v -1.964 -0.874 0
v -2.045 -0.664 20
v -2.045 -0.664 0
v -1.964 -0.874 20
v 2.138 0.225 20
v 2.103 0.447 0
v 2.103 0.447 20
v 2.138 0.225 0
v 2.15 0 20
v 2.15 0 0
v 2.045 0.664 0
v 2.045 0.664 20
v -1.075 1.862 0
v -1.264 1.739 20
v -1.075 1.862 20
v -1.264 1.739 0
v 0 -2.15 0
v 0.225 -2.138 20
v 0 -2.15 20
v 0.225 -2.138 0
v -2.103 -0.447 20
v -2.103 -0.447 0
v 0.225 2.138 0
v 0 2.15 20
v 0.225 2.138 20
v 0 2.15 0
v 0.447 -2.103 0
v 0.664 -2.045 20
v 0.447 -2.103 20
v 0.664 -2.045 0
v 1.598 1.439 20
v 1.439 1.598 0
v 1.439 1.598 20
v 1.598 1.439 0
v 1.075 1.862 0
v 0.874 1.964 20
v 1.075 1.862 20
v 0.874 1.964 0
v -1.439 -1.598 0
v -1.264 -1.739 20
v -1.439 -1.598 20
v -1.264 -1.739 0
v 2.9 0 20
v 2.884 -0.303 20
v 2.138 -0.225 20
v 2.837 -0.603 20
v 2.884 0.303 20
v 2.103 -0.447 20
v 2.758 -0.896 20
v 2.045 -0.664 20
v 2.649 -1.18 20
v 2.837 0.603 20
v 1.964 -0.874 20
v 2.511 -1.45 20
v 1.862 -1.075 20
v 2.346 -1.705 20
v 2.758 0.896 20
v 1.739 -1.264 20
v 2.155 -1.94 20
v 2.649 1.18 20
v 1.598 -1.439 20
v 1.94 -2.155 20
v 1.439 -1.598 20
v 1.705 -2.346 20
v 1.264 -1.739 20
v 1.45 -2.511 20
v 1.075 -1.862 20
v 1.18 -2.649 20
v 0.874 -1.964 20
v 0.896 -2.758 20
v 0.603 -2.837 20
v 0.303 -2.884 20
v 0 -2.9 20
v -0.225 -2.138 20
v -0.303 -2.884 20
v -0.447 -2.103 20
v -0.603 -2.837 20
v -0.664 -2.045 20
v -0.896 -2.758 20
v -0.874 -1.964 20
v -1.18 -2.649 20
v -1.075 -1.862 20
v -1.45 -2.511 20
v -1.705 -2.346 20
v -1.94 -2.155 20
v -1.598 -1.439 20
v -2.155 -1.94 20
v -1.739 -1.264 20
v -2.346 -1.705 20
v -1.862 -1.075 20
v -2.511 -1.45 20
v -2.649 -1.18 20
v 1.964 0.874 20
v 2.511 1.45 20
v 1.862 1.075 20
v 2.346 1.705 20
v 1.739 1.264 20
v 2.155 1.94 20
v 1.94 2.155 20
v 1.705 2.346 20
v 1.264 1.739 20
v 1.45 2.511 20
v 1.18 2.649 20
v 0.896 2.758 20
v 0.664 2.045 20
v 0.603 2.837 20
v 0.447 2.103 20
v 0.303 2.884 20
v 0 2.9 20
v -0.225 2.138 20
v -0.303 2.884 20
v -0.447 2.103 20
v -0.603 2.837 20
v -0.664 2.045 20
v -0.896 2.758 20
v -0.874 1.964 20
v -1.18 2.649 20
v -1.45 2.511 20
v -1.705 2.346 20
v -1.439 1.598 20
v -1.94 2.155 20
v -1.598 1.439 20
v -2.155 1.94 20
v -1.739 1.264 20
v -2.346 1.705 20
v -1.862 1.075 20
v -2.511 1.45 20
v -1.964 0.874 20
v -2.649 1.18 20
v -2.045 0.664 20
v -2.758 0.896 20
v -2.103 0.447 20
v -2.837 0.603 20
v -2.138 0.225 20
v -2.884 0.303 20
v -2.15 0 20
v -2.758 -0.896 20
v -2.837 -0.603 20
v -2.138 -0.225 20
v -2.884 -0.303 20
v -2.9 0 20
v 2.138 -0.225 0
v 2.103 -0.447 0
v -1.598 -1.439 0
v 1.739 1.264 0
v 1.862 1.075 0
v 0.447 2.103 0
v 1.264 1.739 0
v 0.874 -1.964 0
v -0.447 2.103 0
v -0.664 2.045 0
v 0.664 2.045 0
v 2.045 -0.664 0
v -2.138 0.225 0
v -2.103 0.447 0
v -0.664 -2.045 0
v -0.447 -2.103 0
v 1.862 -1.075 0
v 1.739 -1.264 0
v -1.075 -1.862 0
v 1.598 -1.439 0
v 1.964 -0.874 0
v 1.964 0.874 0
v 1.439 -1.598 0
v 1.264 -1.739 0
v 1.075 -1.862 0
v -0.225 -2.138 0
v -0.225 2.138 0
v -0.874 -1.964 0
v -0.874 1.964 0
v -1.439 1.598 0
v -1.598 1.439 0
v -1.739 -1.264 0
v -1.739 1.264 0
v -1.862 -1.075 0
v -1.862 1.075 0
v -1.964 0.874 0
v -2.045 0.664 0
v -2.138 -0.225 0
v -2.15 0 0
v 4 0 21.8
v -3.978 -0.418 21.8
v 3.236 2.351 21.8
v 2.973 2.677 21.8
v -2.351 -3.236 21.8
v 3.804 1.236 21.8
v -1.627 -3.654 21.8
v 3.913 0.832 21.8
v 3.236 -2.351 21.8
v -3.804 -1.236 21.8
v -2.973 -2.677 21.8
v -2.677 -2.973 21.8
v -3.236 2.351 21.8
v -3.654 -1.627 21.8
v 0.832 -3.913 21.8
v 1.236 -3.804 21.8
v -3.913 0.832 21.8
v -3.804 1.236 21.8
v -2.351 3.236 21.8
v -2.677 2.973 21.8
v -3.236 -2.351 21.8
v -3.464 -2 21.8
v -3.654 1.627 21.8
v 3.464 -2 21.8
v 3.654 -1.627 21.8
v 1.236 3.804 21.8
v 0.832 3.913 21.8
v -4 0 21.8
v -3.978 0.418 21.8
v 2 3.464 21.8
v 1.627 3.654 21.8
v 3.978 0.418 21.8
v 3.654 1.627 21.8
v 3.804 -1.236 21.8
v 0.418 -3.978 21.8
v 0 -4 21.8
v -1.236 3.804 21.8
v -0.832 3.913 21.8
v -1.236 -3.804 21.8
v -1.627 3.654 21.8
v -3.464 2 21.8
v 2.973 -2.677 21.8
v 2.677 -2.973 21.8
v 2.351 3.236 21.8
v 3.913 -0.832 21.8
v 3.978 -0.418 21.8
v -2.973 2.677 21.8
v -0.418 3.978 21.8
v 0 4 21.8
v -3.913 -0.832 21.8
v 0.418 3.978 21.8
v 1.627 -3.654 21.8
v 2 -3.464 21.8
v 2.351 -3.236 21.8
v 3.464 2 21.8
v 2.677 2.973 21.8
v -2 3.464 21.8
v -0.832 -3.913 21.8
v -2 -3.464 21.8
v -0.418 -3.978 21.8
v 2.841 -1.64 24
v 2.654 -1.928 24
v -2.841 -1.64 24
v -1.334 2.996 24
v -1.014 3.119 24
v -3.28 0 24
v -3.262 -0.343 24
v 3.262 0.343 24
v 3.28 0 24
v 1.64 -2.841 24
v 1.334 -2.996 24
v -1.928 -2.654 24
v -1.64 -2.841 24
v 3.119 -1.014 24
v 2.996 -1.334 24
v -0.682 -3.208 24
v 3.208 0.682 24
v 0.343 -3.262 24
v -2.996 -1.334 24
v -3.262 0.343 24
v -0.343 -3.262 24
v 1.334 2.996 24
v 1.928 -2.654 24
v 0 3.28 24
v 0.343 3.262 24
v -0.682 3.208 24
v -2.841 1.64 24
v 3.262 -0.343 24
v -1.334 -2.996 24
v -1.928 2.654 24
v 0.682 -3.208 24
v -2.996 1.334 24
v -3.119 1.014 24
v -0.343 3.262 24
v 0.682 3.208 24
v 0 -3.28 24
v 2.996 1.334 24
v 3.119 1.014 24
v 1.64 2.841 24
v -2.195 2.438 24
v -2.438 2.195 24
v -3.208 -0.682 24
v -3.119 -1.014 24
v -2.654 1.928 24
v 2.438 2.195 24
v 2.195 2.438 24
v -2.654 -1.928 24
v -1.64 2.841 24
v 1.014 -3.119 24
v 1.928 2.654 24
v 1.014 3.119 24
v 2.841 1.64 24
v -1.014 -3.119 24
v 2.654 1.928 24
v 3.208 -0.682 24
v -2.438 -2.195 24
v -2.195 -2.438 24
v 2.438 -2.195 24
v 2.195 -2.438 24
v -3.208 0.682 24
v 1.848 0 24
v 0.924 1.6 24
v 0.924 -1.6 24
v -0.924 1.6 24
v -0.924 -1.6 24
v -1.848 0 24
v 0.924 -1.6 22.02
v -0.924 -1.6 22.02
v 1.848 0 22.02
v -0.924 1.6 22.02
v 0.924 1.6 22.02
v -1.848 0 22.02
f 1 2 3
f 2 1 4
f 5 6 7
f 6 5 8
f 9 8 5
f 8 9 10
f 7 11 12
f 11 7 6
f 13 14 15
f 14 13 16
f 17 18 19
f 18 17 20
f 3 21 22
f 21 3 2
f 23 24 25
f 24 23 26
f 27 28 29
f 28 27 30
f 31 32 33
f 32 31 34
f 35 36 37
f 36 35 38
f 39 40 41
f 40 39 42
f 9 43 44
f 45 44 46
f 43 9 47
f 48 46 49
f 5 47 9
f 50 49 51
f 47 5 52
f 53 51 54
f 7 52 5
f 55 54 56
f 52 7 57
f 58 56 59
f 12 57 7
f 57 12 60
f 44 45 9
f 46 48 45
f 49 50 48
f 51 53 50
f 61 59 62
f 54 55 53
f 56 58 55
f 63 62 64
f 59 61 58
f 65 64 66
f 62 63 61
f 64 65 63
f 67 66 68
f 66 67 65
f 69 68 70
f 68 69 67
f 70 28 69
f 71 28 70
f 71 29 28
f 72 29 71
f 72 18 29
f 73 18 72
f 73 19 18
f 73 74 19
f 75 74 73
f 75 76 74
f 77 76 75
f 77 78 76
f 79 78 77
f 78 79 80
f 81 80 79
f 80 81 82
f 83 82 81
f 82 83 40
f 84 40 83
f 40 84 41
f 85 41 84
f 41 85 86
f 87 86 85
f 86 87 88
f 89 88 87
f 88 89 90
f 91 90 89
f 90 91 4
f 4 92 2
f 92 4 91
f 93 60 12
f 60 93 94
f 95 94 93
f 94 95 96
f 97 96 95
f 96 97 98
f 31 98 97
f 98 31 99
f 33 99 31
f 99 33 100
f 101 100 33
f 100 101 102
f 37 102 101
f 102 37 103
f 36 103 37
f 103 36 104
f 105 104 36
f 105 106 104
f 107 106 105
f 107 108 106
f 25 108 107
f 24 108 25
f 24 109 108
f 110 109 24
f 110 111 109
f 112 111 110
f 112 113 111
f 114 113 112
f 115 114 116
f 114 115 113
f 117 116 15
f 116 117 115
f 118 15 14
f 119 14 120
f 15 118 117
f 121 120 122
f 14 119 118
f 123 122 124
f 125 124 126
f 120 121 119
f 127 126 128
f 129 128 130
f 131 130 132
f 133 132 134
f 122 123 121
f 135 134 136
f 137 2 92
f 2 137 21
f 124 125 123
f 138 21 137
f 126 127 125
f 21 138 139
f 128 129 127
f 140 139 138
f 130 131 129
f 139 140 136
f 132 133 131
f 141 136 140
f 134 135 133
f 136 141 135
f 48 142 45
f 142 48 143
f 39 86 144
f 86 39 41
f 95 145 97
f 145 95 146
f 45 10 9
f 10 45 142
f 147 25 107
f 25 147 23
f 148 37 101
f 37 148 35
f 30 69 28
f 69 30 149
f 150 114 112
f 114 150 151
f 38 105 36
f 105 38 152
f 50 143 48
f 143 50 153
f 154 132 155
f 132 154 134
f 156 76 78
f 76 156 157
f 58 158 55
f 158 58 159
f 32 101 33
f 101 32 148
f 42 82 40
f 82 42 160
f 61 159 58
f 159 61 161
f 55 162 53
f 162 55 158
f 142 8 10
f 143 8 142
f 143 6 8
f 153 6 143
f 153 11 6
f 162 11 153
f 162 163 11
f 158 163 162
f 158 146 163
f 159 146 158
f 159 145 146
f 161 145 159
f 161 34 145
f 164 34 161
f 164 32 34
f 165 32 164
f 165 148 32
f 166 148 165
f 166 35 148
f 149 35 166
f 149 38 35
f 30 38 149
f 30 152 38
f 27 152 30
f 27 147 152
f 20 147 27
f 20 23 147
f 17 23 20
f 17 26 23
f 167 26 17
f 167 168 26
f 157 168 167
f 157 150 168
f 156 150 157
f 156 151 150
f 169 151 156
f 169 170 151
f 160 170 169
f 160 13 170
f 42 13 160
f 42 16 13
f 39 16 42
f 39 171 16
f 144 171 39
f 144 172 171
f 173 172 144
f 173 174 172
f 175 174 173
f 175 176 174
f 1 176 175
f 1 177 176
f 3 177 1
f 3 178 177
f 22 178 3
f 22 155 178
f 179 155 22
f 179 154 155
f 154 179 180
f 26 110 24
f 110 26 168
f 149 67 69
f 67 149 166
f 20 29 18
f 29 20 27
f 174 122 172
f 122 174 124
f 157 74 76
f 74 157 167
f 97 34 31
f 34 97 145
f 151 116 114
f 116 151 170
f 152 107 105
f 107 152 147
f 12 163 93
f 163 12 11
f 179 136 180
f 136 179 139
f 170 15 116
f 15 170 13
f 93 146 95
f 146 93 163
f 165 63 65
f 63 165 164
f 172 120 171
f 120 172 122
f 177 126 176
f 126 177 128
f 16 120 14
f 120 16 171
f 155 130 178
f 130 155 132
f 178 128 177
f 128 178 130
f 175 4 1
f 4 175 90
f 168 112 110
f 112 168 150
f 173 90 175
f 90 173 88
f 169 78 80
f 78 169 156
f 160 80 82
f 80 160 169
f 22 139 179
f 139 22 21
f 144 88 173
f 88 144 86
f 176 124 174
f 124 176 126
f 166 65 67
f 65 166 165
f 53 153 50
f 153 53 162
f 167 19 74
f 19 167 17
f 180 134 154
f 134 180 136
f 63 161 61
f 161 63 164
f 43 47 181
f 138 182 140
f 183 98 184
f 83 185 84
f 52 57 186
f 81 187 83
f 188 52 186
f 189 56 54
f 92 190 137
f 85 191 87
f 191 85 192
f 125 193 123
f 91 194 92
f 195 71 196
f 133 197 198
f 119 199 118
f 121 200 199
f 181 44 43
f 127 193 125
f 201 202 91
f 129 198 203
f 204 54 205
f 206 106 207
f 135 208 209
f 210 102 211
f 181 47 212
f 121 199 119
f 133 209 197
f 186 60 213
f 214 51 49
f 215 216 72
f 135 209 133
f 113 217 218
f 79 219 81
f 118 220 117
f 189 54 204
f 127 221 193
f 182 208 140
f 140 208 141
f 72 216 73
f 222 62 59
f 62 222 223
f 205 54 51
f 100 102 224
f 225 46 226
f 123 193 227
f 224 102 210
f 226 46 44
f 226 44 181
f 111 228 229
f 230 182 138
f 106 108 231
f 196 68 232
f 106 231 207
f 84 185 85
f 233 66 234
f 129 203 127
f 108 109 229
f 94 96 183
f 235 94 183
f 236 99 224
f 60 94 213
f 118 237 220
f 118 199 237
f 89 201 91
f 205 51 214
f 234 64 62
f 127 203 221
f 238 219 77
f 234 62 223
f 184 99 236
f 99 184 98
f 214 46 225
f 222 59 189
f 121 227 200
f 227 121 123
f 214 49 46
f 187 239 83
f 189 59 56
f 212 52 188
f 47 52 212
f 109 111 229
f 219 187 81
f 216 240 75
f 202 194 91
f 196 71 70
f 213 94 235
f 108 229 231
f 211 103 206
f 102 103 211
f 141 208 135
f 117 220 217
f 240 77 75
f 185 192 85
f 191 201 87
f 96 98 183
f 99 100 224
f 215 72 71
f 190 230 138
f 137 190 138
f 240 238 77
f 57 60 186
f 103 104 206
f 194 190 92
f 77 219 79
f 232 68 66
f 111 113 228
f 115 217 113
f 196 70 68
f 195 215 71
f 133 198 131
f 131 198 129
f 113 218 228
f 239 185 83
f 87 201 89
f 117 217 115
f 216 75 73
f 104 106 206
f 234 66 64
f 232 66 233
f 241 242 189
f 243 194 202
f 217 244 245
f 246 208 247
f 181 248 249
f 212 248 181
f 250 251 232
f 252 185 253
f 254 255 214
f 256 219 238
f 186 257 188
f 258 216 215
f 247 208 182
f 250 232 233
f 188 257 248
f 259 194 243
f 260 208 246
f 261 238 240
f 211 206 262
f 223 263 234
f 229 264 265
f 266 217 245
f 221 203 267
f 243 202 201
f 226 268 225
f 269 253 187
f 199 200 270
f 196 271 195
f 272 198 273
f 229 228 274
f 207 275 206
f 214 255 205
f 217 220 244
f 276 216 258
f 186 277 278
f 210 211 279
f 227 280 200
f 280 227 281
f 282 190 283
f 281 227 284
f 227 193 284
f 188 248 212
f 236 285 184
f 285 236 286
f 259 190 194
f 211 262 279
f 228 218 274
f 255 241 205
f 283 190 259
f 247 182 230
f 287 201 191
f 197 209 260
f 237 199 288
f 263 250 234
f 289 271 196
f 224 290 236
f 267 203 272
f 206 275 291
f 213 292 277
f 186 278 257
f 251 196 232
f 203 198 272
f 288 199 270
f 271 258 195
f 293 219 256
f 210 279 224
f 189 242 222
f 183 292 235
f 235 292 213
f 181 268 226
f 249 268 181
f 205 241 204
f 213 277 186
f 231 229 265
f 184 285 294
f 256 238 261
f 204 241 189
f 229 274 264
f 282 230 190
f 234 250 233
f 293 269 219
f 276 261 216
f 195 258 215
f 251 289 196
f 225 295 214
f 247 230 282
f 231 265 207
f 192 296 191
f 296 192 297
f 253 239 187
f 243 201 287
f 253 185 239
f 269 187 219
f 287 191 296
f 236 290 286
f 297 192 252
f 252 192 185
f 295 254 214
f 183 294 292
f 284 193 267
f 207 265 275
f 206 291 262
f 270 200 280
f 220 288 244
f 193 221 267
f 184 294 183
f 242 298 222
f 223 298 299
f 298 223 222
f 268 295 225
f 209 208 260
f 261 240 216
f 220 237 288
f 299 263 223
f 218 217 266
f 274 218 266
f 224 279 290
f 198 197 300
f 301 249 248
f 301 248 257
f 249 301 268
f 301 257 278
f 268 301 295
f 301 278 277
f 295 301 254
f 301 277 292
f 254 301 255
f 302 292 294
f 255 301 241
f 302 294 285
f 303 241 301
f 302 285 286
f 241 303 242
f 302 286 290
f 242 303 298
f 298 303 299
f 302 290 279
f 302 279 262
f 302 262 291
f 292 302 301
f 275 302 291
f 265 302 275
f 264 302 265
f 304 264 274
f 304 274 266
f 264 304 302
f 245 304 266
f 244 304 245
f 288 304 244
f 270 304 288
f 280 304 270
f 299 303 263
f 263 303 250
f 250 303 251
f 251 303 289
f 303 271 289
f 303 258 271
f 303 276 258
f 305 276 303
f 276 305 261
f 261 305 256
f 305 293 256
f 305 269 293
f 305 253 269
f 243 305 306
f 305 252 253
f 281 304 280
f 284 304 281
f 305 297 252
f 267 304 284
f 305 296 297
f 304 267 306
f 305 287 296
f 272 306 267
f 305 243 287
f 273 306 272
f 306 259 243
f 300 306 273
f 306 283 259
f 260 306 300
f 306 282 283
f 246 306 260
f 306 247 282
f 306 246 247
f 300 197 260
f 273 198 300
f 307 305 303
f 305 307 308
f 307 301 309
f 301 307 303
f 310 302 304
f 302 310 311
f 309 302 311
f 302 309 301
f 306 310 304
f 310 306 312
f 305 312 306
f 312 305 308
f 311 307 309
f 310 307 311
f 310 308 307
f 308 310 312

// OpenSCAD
// Low-profile button-head screw.
$fn = 60;
eps = 0.02;
shaft_d = 4.3;
head_d = 8;
head_h = 4;
shaft_l = 20;
socket_flat = head_d * 0.40;
difference() {
    union() {
        cylinder(d = shaft_d, h = shaft_l);
        translate([0, 0, shaft_l]) cylinder(d1 = shaft_d + 1.5, d2 = head_d, h = head_h * 0.45);
        translate([0, 0, shaft_l + head_h * 0.45]) cylinder(d1 = head_d, d2 = head_d * 0.82, h = head_h * 0.55);
    }
    translate([0, 0, shaft_l + head_h - head_h * 0.5 + eps])
        cylinder(d = socket_flat / cos(30), h = head_h * 0.5 + eps, $fn = 6);
}
